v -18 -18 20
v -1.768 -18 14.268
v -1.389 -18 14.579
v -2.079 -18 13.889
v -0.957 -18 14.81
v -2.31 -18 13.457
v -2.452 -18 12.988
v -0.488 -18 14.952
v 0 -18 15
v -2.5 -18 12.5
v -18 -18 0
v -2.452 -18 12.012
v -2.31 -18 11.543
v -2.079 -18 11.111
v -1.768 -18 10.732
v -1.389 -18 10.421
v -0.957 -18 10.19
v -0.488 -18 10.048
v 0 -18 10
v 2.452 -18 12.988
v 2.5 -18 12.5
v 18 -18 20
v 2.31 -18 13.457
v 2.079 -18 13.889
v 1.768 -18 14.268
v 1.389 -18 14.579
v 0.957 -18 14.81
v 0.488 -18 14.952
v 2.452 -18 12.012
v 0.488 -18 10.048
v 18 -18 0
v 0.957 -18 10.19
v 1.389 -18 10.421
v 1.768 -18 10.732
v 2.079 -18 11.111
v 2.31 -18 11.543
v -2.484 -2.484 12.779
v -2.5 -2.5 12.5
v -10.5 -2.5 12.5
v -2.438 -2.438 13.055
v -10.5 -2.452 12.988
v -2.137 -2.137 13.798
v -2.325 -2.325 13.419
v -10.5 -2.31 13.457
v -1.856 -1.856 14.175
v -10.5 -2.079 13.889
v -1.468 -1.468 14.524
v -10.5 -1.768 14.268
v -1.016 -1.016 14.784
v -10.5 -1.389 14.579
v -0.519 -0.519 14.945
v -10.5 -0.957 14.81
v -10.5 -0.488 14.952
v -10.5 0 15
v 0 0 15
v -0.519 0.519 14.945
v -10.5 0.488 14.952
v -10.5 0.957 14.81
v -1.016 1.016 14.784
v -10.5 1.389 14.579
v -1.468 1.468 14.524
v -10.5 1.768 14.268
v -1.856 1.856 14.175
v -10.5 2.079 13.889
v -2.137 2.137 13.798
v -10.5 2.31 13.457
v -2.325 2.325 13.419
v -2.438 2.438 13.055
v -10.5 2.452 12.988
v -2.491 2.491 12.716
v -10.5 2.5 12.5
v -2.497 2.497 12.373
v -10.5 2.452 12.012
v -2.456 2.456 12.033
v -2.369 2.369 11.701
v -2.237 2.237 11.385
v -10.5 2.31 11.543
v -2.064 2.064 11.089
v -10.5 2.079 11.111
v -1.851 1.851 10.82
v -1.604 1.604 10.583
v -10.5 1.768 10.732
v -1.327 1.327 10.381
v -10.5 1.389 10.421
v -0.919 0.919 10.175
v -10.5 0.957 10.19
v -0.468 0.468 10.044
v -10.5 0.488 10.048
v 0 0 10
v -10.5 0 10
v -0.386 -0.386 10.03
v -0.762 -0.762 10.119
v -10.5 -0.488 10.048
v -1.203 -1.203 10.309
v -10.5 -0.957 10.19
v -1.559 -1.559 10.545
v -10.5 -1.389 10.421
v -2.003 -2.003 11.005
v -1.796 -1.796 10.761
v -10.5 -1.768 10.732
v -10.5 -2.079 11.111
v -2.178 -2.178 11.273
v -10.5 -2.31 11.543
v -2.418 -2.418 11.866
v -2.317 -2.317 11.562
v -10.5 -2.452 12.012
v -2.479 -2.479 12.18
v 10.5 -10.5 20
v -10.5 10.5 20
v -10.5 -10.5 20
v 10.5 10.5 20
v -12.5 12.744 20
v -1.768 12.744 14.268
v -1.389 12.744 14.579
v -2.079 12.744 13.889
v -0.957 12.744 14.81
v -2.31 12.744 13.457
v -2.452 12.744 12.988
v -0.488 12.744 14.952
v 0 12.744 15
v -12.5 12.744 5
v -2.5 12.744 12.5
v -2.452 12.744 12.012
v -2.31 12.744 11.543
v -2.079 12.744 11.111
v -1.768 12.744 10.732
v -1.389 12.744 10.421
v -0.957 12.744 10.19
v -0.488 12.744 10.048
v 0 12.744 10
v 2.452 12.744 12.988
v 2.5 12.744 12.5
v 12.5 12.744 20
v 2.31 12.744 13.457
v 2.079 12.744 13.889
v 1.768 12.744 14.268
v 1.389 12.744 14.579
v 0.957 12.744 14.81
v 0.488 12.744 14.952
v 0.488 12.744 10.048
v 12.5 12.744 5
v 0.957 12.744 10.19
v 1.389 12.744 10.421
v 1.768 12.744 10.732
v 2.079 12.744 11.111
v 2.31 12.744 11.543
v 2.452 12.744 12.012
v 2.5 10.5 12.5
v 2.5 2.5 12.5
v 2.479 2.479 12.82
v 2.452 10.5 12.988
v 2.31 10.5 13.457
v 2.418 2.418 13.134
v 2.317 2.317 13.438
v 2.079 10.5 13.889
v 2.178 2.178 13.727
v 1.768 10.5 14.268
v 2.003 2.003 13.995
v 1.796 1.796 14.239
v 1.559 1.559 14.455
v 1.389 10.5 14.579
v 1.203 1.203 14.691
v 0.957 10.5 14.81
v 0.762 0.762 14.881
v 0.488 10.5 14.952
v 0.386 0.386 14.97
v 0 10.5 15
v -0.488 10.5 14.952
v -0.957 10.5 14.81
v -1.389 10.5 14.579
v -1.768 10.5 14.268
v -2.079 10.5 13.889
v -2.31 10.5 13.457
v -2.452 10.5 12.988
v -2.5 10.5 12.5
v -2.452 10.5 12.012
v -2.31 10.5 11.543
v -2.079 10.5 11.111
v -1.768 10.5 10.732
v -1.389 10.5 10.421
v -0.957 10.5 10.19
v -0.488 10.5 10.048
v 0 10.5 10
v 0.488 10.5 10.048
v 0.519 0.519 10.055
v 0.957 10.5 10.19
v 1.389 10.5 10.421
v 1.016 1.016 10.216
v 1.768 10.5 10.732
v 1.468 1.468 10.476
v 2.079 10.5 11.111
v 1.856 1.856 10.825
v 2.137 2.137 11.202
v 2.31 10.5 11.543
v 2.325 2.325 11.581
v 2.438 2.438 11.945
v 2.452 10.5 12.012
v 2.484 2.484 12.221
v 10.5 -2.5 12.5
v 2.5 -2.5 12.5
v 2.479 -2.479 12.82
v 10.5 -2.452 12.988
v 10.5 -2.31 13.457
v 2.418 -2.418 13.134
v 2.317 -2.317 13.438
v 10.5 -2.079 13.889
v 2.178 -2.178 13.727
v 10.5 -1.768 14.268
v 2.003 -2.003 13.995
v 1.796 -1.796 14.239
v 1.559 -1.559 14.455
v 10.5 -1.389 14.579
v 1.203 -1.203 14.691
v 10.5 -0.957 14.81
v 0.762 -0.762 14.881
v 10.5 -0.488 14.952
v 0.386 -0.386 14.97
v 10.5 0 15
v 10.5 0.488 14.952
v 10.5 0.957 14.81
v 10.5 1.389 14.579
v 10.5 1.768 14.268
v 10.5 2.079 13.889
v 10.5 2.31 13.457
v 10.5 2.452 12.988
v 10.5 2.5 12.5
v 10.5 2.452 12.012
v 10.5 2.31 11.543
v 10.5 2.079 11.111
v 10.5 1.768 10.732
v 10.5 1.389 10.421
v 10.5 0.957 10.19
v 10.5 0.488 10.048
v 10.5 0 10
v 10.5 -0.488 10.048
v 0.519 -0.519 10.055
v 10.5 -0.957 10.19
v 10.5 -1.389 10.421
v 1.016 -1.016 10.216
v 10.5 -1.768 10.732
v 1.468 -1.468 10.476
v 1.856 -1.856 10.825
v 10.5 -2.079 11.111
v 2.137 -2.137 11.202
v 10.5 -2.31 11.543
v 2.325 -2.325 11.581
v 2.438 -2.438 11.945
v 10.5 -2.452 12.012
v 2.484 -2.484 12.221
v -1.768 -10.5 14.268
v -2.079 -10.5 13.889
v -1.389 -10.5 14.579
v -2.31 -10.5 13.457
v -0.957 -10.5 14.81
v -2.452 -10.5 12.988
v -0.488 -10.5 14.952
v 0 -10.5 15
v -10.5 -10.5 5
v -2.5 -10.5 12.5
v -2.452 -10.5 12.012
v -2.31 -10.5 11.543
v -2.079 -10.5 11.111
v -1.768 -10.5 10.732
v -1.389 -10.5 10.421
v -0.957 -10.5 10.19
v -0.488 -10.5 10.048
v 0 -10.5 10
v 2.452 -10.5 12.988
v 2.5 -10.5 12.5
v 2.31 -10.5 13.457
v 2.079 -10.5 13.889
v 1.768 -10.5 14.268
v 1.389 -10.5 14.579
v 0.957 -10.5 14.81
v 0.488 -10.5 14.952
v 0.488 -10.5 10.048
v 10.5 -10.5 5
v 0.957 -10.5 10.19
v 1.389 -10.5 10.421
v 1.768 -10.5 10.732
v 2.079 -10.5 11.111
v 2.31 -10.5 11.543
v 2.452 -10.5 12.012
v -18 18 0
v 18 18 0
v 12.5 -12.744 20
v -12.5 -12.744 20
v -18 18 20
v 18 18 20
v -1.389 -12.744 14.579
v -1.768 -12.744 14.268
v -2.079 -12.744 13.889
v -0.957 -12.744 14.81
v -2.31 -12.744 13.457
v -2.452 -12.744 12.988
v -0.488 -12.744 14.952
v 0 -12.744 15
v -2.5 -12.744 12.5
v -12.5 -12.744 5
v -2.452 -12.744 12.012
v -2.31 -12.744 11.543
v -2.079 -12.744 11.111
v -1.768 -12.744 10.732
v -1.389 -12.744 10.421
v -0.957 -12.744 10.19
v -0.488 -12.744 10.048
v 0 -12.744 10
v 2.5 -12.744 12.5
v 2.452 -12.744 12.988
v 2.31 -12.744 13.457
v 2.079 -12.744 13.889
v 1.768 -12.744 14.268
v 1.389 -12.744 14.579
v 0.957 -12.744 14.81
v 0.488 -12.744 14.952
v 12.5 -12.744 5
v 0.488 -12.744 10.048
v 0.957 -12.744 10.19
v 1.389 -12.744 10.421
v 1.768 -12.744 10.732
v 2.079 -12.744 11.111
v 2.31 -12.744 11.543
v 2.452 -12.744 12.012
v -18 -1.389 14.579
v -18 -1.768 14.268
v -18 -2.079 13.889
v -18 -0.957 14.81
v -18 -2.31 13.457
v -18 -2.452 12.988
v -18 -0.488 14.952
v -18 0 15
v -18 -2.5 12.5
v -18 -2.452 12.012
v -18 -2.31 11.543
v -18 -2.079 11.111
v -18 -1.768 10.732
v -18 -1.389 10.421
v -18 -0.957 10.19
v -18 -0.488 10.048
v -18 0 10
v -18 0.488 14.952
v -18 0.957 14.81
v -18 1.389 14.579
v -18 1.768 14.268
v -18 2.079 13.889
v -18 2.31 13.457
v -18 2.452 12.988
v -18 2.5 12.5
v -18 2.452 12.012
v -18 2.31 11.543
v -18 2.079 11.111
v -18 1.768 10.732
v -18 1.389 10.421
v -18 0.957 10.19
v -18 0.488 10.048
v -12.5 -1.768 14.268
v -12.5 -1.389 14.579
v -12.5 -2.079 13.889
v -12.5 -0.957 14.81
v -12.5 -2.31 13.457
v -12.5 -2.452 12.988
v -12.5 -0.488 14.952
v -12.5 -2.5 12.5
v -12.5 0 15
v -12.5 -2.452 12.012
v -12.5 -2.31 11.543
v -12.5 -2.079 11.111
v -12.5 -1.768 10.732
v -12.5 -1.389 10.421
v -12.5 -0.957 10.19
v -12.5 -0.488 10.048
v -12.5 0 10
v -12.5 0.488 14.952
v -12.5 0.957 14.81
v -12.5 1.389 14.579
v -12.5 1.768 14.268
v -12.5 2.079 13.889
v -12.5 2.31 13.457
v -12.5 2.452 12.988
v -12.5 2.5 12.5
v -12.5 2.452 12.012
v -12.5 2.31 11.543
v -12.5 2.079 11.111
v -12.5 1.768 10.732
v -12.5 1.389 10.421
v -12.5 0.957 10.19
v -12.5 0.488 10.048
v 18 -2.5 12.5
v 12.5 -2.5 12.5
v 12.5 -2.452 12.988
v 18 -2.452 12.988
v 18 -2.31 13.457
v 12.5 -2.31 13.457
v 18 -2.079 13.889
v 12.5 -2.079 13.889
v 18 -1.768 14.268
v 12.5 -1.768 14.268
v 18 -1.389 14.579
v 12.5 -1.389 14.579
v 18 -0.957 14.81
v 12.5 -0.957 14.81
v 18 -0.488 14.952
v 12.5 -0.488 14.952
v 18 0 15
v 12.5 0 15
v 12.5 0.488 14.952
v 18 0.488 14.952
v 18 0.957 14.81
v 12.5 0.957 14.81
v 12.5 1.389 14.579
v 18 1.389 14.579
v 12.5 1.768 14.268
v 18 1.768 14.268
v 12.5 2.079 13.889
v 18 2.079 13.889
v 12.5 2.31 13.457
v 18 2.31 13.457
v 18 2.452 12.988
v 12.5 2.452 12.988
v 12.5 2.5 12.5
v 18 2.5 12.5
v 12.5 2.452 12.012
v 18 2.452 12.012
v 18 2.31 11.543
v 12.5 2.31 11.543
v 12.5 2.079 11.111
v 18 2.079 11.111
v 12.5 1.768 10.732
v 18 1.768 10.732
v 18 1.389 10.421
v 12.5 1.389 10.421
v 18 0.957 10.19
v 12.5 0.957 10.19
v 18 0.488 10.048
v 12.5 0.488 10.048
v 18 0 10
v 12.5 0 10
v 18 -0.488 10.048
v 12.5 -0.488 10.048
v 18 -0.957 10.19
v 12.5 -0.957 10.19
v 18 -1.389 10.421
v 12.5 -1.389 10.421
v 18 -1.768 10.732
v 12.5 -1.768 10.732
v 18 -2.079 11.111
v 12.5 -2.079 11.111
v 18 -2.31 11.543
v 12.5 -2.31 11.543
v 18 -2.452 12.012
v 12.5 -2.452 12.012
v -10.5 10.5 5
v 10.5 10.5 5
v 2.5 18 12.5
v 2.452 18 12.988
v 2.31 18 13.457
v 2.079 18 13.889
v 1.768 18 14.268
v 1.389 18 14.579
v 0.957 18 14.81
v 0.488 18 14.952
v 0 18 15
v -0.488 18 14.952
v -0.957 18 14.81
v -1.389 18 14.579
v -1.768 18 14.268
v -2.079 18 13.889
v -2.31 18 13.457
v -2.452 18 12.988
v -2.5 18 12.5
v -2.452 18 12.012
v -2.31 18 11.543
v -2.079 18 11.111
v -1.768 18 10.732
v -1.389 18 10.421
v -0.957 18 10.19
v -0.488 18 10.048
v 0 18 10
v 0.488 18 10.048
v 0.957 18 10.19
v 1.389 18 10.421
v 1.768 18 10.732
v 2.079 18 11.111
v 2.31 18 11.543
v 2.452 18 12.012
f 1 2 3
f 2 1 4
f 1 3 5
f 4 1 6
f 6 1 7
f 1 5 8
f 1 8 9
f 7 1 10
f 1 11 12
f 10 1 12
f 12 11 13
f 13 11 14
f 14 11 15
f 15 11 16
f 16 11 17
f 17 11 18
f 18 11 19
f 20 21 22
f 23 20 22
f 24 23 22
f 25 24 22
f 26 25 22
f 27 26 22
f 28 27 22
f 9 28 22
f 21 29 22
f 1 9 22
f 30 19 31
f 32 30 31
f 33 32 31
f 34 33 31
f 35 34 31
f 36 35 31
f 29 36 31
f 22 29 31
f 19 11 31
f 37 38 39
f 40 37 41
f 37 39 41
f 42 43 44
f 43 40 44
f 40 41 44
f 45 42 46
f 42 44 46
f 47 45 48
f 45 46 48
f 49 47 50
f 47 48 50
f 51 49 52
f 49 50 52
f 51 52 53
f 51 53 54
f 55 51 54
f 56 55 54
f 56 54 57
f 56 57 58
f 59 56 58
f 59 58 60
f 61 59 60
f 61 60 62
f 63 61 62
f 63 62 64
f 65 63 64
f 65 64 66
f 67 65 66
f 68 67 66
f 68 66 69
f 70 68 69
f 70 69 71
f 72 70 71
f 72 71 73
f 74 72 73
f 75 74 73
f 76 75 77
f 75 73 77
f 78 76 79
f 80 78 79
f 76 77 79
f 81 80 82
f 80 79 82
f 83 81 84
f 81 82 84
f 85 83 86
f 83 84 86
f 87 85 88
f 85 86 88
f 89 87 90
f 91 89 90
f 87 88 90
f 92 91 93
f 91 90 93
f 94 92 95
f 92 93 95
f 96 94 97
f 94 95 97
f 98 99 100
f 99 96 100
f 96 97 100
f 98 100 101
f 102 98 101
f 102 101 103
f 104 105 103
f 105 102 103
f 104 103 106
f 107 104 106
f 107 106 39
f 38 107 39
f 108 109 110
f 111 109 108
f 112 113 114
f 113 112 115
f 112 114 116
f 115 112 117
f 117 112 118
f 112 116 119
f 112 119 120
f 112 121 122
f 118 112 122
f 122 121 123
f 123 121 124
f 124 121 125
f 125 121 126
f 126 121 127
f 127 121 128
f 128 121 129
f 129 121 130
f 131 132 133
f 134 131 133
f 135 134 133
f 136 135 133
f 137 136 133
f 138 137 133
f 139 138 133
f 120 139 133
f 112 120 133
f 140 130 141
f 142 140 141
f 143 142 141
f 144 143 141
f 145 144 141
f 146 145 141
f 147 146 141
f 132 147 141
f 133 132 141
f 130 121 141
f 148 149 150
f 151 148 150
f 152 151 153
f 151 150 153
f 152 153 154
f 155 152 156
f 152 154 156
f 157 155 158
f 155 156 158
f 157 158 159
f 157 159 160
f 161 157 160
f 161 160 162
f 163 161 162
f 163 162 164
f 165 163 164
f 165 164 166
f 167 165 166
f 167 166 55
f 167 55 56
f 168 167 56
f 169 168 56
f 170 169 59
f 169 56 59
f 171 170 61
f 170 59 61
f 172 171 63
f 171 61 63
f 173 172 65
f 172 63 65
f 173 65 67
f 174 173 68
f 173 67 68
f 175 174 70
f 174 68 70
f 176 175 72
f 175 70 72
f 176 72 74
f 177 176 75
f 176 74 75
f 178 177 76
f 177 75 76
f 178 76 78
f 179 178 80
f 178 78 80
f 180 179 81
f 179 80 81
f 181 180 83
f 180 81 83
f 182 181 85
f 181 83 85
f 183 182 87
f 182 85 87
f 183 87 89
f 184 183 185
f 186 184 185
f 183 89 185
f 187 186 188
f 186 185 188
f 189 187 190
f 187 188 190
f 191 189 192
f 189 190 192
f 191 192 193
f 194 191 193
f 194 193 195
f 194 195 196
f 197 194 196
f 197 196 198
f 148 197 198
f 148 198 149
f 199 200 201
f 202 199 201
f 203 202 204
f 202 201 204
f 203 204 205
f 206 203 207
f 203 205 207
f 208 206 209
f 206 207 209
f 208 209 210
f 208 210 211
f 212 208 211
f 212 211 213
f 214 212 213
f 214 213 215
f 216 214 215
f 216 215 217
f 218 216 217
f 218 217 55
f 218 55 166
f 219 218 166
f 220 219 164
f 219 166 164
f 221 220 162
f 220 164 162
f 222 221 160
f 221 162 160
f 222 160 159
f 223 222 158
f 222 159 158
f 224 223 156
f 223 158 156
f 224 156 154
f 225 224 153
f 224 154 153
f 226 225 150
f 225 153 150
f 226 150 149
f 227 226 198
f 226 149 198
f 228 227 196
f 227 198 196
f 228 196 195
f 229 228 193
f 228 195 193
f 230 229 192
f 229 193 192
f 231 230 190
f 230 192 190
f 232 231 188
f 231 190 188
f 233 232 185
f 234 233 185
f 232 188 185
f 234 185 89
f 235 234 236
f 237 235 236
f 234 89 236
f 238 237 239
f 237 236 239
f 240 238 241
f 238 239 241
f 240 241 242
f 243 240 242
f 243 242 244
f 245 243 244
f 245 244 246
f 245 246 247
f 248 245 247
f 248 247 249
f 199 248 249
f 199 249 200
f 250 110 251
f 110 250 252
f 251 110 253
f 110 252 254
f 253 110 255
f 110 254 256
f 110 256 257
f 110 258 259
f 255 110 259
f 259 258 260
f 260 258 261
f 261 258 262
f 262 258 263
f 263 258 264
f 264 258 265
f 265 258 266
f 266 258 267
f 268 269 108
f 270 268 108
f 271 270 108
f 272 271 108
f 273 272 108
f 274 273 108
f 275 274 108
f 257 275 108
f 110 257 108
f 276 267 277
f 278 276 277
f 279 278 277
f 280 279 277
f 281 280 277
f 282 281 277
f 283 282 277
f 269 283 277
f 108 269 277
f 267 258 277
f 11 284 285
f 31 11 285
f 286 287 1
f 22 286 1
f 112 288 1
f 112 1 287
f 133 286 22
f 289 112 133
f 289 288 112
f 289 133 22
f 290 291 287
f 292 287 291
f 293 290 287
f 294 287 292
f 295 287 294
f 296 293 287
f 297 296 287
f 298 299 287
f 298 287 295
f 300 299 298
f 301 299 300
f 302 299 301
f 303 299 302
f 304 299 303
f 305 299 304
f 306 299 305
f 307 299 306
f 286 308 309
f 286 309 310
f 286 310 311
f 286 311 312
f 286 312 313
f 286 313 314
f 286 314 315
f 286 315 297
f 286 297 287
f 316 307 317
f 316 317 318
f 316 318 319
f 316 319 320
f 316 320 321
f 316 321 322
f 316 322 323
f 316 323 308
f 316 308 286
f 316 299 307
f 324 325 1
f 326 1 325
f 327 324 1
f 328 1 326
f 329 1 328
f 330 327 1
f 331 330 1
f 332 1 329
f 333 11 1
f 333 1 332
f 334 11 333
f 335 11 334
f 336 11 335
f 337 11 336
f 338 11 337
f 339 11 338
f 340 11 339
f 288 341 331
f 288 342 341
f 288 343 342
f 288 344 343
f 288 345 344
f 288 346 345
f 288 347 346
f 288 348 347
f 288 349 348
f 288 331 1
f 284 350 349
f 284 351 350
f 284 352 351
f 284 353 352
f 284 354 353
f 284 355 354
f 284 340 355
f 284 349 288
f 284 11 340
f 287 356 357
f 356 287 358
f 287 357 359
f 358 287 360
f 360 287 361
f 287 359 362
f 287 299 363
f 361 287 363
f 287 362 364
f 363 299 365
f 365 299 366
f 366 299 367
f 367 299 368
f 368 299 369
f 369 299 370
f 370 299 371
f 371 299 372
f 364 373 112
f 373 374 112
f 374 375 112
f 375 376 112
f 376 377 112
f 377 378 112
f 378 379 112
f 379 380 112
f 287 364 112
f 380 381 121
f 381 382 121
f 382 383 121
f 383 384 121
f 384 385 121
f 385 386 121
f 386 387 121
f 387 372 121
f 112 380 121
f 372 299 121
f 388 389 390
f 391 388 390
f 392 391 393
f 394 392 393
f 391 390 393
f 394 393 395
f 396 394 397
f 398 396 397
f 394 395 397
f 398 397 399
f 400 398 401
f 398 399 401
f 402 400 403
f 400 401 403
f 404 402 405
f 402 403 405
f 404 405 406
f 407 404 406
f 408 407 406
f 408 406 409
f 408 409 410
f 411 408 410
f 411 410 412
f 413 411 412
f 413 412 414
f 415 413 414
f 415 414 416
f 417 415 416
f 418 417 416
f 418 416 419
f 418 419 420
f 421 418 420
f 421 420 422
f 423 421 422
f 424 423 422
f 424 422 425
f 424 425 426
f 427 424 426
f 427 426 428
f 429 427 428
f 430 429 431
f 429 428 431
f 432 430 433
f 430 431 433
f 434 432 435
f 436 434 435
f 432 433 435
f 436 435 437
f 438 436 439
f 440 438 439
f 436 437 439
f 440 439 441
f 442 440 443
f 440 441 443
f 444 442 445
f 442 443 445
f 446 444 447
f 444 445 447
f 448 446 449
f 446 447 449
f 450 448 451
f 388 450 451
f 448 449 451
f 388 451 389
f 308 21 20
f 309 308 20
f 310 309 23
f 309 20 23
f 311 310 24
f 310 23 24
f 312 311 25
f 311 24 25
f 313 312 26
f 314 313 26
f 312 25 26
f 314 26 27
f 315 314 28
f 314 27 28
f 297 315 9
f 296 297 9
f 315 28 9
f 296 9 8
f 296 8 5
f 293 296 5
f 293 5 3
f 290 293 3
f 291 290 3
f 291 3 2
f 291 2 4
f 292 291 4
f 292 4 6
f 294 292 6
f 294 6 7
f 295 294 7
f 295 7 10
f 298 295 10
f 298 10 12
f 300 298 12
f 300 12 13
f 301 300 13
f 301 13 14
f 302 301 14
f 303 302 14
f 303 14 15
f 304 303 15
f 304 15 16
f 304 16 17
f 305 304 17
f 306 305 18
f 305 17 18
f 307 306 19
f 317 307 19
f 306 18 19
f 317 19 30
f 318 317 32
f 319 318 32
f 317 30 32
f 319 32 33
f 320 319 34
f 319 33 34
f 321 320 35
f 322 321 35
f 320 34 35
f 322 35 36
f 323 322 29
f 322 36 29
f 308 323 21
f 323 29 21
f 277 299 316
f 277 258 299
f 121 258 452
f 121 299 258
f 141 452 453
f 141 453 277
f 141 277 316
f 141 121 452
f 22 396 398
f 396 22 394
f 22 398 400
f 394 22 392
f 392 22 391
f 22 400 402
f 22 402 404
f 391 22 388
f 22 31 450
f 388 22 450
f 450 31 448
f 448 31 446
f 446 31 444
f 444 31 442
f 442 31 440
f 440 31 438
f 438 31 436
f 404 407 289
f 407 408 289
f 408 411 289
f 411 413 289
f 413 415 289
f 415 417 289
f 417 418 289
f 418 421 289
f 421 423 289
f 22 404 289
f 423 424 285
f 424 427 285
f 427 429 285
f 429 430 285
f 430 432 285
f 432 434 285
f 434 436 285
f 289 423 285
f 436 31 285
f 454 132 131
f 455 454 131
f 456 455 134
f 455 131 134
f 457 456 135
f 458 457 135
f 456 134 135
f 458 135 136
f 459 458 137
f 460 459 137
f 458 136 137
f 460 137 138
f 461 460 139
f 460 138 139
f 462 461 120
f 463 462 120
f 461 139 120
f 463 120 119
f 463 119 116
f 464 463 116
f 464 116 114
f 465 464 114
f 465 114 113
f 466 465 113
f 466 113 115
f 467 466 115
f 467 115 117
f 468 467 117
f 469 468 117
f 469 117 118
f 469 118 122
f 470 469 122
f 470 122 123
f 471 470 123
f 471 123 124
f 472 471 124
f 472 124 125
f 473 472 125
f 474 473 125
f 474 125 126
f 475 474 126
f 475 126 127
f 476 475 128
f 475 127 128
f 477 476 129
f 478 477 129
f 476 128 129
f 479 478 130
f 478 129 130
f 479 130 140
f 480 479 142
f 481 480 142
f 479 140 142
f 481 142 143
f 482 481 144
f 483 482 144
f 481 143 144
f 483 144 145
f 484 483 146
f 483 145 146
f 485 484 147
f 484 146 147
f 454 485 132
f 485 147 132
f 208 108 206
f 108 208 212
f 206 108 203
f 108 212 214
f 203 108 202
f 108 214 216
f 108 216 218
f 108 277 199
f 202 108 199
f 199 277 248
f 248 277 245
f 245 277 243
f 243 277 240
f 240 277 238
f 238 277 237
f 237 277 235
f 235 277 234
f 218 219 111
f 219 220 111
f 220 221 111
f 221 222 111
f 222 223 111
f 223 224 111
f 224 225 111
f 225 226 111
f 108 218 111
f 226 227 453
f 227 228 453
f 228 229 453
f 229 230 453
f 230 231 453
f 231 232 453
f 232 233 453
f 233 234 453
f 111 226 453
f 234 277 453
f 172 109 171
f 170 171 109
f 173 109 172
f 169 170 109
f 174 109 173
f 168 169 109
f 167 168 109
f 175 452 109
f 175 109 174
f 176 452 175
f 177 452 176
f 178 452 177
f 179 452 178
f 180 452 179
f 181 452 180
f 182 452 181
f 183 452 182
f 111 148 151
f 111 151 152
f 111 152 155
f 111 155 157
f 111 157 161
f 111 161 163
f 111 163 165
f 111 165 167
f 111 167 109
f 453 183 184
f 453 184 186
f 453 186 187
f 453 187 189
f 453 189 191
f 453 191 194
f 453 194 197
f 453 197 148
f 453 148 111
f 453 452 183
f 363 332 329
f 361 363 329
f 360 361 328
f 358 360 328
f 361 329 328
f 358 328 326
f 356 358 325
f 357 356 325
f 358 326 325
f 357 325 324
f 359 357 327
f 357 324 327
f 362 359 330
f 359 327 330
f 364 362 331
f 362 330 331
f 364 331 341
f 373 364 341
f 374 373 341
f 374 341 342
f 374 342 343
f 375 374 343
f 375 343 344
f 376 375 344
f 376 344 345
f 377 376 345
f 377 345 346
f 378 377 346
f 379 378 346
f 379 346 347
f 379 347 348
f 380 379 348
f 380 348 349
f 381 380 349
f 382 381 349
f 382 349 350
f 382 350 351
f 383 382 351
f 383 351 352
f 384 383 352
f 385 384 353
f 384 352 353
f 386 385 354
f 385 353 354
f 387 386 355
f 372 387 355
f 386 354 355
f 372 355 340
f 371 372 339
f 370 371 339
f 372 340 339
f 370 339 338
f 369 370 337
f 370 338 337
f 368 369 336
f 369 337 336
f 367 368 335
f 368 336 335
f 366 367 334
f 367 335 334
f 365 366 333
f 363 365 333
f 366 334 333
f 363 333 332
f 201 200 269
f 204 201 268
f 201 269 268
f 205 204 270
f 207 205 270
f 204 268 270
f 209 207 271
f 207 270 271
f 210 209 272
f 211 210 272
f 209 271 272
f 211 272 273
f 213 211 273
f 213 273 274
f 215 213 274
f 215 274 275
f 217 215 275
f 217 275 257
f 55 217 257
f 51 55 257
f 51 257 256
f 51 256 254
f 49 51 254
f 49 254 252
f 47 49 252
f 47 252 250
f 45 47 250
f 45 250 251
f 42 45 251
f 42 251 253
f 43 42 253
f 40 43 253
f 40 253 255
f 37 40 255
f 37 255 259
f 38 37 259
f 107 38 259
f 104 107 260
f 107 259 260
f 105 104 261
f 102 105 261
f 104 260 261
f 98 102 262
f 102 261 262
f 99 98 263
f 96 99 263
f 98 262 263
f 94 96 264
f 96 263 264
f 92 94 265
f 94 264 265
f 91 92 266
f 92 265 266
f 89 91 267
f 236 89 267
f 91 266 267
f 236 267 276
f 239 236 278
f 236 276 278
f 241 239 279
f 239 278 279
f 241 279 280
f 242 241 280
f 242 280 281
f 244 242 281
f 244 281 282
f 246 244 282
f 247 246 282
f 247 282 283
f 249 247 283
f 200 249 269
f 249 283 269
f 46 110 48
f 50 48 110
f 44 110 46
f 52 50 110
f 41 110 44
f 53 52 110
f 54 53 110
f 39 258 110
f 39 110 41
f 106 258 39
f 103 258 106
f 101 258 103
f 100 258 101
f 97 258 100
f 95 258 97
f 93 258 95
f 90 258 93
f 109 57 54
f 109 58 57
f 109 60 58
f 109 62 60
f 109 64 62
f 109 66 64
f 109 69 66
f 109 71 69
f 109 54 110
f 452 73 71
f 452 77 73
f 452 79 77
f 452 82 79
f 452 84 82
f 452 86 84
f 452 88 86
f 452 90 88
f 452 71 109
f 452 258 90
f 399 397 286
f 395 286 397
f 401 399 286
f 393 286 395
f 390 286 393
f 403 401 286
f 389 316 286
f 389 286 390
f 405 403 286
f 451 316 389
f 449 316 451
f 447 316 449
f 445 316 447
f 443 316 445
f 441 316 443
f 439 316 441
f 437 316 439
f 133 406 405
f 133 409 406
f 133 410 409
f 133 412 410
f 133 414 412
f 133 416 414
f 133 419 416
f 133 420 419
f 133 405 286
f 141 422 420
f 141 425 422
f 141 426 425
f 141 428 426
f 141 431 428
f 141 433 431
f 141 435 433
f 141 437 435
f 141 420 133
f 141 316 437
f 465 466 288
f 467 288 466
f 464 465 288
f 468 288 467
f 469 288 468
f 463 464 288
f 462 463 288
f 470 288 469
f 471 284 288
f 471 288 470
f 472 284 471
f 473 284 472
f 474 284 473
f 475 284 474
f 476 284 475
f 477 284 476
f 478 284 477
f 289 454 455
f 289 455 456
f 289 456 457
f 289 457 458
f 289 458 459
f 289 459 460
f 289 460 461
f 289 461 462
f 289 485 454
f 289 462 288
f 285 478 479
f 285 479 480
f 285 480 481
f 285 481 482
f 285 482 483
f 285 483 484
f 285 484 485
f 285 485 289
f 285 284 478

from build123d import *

# Parameters (mm, degrees)
F0_W     = 36
F0_H     = 36
F1_DEPTH = 5
F2_W     = 21
F2_H     = 21
F3_DEPTH = 15
F4_W     = 36
F4_H     = 36
F4_W_2   = 25
F4_H_2   = 25.4870138154
F5_DEPTH = 15
F6_R     = 2.5
F7_DEPTH = 40
F8_R     = 2.5
F9_DEPTH = 40


with BuildPart() as f1:
    # F0 (on Top) → F1 (new body)
    with BuildSketch(Plane.XY):
        Rectangle(F0_W, F0_H)
    extrude(amount=F1_DEPTH)

    # F2 (on face) → F3 (join)
    with BuildSketch(Plane.XY.offset(5)):
        Rectangle(F2_W, F2_H)
    extrude(amount=F3_DEPTH)

    # F4 (on face) → F5 (join)
    with BuildSketch(Plane.XY.offset(5)):
        Rectangle(F4_W, F4_H)
        Rectangle(F4_W_2, F4_H_2, mode=Mode.SUBTRACT)
    extrude(amount=F5_DEPTH)

    # F6 (on face) → F7 (cut)
    with BuildSketch(Plane.XZ.offset(18)):
        with Locations((0, 12.5)):
            Circle(F6_R)
    extrude(amount=-F7_DEPTH, mode=Mode.SUBTRACT)

    # F8 (on face) → F9 (cut)
    with BuildSketch(Plane(origin=(-18, 0, 0), x_dir=(0, -1, 0), z_dir=(-1, 0, 0))):
        with Locations((0, 12.5)):
            Circle(F8_R)
    extrude(amount=-F9_DEPTH, mode=Mode.SUBTRACT)


solid = f1.part
